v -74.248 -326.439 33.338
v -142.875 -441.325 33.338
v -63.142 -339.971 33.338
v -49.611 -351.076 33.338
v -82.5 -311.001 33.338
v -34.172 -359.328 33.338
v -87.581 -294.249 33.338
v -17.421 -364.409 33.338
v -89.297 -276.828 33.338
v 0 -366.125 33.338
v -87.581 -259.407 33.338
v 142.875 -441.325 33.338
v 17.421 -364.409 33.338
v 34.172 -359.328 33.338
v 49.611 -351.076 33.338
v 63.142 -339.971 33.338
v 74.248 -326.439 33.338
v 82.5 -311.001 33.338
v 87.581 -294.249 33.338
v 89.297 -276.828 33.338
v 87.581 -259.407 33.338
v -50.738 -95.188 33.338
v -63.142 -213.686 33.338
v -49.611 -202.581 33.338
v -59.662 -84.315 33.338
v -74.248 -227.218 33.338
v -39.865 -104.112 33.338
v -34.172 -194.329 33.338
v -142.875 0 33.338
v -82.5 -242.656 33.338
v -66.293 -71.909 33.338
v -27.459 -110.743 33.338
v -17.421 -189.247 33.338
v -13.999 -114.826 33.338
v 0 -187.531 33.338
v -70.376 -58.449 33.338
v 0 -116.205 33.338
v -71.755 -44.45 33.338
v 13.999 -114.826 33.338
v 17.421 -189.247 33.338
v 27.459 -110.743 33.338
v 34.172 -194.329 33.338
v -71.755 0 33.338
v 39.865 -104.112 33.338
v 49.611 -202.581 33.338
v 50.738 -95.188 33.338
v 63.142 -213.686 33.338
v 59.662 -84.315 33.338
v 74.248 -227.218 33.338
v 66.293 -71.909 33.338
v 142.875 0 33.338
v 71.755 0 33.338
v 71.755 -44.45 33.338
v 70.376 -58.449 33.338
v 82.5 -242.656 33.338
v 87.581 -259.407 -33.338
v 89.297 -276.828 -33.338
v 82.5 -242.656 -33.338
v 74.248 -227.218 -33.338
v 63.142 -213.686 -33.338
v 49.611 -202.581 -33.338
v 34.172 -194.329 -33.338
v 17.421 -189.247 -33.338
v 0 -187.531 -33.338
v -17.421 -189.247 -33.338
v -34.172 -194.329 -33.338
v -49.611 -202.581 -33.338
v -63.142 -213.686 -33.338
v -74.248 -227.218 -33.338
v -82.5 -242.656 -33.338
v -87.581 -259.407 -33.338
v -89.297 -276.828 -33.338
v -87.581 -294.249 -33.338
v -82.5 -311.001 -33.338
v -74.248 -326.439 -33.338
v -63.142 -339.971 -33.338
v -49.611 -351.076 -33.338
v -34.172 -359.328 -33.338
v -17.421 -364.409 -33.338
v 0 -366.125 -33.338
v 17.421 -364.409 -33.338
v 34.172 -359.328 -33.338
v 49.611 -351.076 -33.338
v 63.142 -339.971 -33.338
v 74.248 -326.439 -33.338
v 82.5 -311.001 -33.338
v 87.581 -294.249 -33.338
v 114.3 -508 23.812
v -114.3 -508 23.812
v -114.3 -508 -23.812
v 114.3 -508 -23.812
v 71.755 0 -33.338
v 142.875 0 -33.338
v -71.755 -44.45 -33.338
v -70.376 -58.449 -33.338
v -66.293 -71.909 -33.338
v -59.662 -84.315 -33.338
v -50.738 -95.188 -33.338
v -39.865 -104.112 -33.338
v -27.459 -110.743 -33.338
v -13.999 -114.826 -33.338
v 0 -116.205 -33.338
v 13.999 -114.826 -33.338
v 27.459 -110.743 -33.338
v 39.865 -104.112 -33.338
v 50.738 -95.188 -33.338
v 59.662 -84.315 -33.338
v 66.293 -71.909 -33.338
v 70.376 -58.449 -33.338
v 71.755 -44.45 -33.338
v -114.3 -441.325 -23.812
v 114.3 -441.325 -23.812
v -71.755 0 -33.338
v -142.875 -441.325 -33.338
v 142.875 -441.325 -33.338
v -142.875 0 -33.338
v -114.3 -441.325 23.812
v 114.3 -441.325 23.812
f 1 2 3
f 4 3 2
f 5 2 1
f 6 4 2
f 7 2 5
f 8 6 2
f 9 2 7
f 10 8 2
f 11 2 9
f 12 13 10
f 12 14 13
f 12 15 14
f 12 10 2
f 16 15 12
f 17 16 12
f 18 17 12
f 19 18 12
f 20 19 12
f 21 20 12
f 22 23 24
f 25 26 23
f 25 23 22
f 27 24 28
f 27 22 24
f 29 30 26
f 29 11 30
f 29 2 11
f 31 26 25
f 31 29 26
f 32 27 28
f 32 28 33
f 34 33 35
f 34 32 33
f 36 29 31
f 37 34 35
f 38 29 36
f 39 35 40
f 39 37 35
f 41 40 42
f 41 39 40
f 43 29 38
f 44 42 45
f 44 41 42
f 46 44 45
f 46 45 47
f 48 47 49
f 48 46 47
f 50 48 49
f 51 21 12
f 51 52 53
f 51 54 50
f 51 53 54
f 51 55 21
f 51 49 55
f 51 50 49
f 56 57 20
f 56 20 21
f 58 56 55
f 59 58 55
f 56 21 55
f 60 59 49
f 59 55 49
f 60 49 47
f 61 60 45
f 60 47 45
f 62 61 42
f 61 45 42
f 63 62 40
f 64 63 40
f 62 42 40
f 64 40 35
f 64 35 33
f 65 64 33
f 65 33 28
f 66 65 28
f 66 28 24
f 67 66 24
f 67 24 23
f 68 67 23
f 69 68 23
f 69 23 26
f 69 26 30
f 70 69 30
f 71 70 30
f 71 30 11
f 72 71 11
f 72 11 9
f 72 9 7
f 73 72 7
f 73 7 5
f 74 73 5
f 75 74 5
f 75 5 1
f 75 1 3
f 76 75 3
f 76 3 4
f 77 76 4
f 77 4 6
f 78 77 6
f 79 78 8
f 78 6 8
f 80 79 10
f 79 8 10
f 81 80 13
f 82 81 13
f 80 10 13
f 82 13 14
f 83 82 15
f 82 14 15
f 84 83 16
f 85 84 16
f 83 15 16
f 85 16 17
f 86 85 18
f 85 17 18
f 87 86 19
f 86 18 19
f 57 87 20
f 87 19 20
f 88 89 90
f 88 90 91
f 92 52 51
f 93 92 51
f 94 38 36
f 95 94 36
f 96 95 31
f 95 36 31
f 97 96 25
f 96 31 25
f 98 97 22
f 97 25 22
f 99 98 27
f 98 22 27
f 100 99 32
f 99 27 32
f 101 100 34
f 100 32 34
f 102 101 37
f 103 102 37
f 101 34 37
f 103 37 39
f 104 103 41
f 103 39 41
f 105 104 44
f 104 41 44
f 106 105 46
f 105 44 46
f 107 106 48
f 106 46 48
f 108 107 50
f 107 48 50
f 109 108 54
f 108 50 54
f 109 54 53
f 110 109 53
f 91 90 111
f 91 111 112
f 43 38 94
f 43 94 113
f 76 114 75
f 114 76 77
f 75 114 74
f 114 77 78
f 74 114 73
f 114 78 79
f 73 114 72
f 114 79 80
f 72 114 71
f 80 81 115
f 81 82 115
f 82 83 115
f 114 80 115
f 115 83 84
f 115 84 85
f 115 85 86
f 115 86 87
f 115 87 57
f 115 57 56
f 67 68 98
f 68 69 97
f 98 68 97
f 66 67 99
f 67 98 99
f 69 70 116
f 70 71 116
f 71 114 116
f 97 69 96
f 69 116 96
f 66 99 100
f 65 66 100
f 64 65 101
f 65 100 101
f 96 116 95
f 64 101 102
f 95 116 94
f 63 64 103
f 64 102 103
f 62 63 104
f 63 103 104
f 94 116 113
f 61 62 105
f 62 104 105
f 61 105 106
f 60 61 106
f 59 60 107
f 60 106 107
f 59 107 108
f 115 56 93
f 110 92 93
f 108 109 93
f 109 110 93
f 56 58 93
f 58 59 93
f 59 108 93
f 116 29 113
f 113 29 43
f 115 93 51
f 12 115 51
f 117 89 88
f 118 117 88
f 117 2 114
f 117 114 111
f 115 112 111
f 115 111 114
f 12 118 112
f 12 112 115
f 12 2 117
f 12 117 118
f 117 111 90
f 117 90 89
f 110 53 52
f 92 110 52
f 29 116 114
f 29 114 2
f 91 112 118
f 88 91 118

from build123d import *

# Parameters (mm, degrees)
F0_W     = 285.75
F0_H     = 66.675
F1_DEPTH = 508
F2_W     = 285.75
F2_H     = 66.675
F2_W_2   = 228.6
F2_H_2   = 47.625
F3_DEPTH = 66.675
F4_R     = 89.296875
F4_W     = 143.51
F4_H     = 44.45
F5_DEPTH = 66.676


with BuildPart() as f1:
    # F0 (on Front) → F1 (new body)
    with BuildSketch(Plane.XZ):
        Rectangle(F0_W, F0_H)
    extrude(amount=F1_DEPTH)

    # F2 (on face) → F3 (cut)
    with BuildSketch(Plane.XZ.offset(508)):
        Rectangle(F2_W, F2_H)
        Rectangle(F2_W_2, F2_H_2, mode=Mode.SUBTRACT)
    extrude(amount=-F3_DEPTH, mode=Mode.SUBTRACT)

    # F4 (on face) → F5 (cut, through all)
    with BuildSketch(Plane.XY.offset(33.3375)):
        with Locations((0, -276.82825)):
            Circle(F4_R)
        with BuildLine():
            Line((71.755, -44.45), (-71.755, -44.45))
            ThreePointArc((-71.755, -44.45), (0, -116.205), (71.755, -44.45))
        make_face()
        with Locations((0, -22.225)):
            Rectangle(F4_W, F4_H)
    extrude(amount=-F5_DEPTH, mode=Mode.SUBTRACT)


solid = f1.part
